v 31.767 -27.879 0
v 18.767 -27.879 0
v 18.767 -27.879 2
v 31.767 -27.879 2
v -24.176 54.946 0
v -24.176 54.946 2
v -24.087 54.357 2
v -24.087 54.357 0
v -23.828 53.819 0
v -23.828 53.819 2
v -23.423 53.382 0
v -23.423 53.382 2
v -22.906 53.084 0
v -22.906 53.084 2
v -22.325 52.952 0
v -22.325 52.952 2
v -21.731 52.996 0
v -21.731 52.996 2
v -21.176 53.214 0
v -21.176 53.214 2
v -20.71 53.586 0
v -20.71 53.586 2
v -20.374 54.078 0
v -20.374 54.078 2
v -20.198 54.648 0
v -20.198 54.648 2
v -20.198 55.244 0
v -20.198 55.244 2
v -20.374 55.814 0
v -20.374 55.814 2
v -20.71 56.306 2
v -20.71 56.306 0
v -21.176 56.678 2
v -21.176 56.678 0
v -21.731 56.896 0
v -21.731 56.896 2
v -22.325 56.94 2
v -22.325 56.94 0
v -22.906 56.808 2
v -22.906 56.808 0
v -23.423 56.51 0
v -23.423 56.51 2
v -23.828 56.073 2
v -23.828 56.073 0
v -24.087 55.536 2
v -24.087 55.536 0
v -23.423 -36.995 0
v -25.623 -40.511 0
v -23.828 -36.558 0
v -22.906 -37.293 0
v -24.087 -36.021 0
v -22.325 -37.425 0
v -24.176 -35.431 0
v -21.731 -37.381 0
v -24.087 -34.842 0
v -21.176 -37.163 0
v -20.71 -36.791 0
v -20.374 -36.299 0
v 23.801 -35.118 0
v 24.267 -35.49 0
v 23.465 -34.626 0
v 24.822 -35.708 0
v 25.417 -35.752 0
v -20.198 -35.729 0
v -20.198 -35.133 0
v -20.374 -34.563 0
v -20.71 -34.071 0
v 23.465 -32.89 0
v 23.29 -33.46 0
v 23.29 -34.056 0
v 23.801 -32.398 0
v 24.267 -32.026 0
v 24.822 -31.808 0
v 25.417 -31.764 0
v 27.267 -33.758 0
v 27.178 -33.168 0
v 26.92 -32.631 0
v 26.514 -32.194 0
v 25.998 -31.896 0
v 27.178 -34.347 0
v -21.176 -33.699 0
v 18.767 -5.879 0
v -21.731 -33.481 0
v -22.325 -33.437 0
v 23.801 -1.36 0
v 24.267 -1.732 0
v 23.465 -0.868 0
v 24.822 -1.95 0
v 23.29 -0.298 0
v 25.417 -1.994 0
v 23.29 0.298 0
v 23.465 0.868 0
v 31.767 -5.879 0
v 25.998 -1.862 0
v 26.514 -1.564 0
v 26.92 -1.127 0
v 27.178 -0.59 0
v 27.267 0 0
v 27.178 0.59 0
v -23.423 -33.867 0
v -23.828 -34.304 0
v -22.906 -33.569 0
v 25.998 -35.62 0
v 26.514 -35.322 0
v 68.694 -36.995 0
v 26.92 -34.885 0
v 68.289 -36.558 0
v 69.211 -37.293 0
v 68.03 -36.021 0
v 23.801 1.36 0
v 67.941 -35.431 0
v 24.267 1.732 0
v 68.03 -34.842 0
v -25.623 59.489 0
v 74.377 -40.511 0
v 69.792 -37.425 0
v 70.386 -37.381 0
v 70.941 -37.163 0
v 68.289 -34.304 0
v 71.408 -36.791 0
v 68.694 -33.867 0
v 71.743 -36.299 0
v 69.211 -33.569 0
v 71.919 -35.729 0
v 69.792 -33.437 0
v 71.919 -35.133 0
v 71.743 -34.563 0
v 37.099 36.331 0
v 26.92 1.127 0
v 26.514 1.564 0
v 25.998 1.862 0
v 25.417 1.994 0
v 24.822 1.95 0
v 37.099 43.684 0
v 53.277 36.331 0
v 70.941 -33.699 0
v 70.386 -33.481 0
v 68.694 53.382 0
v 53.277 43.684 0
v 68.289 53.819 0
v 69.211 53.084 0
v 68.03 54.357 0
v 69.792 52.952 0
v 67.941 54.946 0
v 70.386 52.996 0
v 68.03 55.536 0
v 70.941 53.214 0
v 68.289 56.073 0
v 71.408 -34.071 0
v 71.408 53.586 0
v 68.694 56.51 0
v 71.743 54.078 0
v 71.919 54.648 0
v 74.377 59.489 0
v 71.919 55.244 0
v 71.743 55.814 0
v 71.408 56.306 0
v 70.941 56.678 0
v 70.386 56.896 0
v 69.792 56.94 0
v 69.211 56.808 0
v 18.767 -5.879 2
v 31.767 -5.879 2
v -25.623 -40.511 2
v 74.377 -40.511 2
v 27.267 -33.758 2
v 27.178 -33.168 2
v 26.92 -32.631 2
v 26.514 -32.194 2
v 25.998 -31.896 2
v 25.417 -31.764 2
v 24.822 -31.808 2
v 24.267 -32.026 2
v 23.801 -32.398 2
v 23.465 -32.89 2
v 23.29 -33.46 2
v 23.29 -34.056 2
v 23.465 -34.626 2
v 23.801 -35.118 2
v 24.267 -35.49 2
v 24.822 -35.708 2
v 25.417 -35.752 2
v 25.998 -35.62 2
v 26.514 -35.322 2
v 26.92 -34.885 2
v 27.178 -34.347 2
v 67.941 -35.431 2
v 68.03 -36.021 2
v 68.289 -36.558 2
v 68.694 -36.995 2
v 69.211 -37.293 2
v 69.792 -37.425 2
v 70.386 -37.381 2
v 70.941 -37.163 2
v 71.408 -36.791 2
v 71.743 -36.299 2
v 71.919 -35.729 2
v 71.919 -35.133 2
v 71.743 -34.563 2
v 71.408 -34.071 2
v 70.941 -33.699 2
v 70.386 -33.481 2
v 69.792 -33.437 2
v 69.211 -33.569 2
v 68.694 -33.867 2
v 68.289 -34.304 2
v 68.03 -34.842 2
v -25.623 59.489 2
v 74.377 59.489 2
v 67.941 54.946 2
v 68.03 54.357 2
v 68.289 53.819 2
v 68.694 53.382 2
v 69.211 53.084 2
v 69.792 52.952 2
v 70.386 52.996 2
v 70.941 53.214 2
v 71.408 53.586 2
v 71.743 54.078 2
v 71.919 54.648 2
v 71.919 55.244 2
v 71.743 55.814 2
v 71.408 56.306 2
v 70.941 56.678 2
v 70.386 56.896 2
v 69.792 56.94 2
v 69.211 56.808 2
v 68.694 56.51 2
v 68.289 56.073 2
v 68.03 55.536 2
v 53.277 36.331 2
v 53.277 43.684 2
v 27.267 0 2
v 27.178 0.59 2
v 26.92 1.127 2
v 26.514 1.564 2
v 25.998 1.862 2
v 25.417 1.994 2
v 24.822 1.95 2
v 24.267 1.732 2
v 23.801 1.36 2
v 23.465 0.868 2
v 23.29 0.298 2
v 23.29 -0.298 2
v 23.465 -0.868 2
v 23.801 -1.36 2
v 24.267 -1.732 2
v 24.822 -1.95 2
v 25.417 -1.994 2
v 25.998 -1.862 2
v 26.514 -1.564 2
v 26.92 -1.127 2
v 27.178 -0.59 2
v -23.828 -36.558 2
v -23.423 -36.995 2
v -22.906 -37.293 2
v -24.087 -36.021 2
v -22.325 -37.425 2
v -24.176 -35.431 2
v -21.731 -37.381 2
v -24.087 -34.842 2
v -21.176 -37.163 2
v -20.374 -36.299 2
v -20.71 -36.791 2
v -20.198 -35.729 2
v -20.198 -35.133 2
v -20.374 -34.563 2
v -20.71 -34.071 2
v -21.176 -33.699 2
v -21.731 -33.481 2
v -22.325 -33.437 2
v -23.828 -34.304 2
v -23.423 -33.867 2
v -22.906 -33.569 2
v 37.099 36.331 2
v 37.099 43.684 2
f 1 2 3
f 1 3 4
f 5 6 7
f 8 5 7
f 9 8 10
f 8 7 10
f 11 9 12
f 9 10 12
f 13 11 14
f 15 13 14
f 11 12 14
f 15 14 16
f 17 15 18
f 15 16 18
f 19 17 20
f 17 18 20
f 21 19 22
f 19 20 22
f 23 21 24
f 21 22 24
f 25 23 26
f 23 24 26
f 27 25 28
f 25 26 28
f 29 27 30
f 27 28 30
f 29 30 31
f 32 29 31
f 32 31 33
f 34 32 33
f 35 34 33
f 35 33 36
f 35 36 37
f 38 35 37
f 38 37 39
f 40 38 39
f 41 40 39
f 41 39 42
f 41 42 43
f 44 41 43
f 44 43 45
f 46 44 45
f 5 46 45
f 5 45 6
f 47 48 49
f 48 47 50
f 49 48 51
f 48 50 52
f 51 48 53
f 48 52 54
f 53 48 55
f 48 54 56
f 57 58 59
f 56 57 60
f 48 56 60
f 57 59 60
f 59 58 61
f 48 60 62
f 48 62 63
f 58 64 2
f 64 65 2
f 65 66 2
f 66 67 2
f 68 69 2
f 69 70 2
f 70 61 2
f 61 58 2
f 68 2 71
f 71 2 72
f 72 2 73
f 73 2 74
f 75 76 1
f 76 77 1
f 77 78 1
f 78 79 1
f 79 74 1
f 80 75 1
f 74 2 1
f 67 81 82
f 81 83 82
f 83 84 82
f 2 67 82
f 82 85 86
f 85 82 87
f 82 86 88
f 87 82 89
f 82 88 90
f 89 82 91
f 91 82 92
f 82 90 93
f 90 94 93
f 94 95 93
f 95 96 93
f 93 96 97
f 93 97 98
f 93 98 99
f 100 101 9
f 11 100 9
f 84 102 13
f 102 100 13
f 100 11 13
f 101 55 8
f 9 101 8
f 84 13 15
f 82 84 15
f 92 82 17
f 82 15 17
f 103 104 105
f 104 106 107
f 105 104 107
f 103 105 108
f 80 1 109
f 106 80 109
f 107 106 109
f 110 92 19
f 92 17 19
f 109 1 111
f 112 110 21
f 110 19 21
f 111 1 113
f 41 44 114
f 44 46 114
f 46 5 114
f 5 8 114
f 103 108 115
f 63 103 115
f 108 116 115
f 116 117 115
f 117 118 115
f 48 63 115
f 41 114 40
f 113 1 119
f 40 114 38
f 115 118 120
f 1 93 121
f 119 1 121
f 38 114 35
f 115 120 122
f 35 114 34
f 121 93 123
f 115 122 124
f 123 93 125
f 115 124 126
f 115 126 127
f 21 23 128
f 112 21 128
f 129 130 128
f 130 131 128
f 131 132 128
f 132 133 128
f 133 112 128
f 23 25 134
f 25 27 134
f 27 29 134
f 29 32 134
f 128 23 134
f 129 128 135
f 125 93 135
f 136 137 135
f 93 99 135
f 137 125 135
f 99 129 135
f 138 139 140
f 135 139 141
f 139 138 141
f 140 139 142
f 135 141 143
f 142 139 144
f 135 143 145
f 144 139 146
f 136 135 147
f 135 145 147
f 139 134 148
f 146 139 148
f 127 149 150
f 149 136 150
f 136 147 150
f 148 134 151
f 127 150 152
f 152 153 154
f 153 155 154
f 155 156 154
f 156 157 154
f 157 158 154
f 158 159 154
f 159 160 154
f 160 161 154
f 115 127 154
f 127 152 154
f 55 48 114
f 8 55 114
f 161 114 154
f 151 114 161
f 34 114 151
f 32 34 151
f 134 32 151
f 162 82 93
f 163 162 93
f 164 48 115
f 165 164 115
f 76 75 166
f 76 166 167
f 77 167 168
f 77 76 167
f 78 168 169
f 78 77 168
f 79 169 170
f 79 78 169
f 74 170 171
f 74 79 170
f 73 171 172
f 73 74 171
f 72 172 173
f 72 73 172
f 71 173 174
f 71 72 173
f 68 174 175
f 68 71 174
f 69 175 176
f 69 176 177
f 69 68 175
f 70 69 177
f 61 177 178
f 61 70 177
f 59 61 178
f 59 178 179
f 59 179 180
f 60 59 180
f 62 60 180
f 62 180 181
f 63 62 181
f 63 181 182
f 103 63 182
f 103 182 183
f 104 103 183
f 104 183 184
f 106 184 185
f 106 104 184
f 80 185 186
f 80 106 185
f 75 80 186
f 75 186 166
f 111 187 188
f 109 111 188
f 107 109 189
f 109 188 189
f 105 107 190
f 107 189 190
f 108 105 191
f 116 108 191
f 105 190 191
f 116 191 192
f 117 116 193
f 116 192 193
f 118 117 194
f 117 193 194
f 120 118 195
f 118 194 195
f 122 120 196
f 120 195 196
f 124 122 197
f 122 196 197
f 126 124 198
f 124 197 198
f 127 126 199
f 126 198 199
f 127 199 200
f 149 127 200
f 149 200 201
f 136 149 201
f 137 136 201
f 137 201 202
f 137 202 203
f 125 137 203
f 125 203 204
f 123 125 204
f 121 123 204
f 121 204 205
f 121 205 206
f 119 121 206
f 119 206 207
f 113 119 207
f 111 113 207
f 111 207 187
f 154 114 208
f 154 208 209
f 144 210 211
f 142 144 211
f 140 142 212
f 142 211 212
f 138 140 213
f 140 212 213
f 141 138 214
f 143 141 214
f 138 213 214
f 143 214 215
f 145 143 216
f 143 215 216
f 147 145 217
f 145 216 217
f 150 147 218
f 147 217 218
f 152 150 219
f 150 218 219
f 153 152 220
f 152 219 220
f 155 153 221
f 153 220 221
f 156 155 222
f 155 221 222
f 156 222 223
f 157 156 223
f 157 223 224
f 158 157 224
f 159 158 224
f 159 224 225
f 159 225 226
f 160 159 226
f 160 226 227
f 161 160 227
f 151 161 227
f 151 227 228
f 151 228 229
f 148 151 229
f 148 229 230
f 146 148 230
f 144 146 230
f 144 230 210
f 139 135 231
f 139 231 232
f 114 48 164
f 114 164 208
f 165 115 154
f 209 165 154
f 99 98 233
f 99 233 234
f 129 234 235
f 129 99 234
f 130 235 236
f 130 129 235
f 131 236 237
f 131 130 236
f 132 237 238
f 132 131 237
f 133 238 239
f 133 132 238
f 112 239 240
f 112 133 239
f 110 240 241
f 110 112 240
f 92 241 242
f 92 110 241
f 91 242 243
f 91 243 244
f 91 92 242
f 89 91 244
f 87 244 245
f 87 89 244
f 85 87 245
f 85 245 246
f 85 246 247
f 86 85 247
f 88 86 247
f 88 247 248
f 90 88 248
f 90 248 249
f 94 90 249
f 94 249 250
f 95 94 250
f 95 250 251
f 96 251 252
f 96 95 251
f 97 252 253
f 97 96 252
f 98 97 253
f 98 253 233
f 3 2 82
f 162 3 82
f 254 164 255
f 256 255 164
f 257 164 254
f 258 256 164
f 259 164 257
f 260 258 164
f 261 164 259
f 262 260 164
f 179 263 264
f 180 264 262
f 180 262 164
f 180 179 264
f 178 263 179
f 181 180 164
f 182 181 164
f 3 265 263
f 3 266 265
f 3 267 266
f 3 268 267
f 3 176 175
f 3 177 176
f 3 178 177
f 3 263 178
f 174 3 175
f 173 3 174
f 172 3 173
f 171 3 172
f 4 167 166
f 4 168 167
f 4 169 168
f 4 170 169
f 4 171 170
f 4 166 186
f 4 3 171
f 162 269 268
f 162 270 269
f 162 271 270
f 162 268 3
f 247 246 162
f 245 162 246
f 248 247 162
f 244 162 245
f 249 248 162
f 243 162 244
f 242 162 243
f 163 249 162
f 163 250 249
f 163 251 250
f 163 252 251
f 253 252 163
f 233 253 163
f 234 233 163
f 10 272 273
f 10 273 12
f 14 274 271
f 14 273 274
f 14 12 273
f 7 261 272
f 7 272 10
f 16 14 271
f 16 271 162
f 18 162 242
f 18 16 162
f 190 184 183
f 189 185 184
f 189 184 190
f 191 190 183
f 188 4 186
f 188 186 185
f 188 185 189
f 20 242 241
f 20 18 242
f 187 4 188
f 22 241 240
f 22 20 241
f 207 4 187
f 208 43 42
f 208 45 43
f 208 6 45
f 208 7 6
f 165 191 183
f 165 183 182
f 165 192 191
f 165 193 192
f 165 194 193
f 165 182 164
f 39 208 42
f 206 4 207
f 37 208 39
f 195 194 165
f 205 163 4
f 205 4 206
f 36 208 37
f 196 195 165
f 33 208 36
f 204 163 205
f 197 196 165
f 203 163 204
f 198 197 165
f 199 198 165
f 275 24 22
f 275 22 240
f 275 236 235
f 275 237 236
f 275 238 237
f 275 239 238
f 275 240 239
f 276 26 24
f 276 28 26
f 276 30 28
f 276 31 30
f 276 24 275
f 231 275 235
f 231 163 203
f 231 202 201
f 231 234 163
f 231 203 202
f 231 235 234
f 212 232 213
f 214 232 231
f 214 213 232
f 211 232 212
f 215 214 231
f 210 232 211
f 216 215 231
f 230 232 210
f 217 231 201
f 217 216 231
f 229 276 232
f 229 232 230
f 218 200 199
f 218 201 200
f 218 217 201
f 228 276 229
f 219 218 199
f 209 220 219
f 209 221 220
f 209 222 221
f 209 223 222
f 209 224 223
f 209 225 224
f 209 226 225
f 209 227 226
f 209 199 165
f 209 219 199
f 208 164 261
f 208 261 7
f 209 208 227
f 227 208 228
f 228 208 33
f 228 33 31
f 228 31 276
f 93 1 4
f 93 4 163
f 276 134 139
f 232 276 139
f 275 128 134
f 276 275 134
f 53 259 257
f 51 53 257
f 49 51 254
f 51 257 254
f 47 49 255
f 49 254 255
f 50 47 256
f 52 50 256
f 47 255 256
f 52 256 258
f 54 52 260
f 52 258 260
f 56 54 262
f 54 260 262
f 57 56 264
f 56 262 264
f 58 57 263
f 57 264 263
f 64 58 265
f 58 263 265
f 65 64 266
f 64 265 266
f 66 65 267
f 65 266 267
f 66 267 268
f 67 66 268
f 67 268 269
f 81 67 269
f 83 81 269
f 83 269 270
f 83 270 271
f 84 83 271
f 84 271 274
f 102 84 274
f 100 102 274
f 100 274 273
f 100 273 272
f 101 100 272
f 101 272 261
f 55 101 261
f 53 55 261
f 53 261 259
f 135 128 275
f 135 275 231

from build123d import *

# Parameters (mm, degrees)
F0_W     = 100
F0_H     = 100
F0_R     = 2
F0_W_2   = 13
F0_H_2   = 22
F0_W_3   = 16.1784952506
F0_H_3   = 7.3538627476
F1_DEPTH = 2
F2_D     = 4
F2_DEPTH = 15
F2_TIP   = 1.2017212381


with BuildPart() as f1:
    # F0 (on Top) → F1 (new body)
    with BuildSketch(Plane.XY):
        with Locations((24.3766545396, 9.4889727443)):
            Rectangle(F0_W, F0_H)
        with Locations((25.2671993673, -33.7579216361)):
            Circle(F0_R, mode=Mode.SUBTRACT)
        with Locations((25.2671993673, -16.8789608181)):
            Rectangle(F0_W_2, F0_H_2, mode=Mode.SUBTRACT)
        with Locations((25.2671993673, 0)):
            Circle(F0_R, mode=Mode.SUBTRACT)
        with Locations((45.1880805272, 40.0074942991)):
            Rectangle(F0_W_3, F0_H_3, mode=Mode.SUBTRACT)
    extrude(amount=F1_DEPTH)

    # F2
    with Locations(Plane(origin=(0, 0, 0), x_dir=(1, 0, 0), z_dir=(0, 0, -1))):
        with Locations((-22.1756645401, -54.9460881411), (69.9414474967, 35.4310135335), (69.9414474967, -54.9460881411), (-22.1756645401, 35.4310135335)):
            Hole(F2_D / 2, depth=F2_DEPTH)
            with Locations((0, 0, -(F2_DEPTH + F2_TIP / 2))):  # 118° drill point
                Cone(0, F2_D / 2, F2_TIP, mode=Mode.SUBTRACT)


solid = f1.part
